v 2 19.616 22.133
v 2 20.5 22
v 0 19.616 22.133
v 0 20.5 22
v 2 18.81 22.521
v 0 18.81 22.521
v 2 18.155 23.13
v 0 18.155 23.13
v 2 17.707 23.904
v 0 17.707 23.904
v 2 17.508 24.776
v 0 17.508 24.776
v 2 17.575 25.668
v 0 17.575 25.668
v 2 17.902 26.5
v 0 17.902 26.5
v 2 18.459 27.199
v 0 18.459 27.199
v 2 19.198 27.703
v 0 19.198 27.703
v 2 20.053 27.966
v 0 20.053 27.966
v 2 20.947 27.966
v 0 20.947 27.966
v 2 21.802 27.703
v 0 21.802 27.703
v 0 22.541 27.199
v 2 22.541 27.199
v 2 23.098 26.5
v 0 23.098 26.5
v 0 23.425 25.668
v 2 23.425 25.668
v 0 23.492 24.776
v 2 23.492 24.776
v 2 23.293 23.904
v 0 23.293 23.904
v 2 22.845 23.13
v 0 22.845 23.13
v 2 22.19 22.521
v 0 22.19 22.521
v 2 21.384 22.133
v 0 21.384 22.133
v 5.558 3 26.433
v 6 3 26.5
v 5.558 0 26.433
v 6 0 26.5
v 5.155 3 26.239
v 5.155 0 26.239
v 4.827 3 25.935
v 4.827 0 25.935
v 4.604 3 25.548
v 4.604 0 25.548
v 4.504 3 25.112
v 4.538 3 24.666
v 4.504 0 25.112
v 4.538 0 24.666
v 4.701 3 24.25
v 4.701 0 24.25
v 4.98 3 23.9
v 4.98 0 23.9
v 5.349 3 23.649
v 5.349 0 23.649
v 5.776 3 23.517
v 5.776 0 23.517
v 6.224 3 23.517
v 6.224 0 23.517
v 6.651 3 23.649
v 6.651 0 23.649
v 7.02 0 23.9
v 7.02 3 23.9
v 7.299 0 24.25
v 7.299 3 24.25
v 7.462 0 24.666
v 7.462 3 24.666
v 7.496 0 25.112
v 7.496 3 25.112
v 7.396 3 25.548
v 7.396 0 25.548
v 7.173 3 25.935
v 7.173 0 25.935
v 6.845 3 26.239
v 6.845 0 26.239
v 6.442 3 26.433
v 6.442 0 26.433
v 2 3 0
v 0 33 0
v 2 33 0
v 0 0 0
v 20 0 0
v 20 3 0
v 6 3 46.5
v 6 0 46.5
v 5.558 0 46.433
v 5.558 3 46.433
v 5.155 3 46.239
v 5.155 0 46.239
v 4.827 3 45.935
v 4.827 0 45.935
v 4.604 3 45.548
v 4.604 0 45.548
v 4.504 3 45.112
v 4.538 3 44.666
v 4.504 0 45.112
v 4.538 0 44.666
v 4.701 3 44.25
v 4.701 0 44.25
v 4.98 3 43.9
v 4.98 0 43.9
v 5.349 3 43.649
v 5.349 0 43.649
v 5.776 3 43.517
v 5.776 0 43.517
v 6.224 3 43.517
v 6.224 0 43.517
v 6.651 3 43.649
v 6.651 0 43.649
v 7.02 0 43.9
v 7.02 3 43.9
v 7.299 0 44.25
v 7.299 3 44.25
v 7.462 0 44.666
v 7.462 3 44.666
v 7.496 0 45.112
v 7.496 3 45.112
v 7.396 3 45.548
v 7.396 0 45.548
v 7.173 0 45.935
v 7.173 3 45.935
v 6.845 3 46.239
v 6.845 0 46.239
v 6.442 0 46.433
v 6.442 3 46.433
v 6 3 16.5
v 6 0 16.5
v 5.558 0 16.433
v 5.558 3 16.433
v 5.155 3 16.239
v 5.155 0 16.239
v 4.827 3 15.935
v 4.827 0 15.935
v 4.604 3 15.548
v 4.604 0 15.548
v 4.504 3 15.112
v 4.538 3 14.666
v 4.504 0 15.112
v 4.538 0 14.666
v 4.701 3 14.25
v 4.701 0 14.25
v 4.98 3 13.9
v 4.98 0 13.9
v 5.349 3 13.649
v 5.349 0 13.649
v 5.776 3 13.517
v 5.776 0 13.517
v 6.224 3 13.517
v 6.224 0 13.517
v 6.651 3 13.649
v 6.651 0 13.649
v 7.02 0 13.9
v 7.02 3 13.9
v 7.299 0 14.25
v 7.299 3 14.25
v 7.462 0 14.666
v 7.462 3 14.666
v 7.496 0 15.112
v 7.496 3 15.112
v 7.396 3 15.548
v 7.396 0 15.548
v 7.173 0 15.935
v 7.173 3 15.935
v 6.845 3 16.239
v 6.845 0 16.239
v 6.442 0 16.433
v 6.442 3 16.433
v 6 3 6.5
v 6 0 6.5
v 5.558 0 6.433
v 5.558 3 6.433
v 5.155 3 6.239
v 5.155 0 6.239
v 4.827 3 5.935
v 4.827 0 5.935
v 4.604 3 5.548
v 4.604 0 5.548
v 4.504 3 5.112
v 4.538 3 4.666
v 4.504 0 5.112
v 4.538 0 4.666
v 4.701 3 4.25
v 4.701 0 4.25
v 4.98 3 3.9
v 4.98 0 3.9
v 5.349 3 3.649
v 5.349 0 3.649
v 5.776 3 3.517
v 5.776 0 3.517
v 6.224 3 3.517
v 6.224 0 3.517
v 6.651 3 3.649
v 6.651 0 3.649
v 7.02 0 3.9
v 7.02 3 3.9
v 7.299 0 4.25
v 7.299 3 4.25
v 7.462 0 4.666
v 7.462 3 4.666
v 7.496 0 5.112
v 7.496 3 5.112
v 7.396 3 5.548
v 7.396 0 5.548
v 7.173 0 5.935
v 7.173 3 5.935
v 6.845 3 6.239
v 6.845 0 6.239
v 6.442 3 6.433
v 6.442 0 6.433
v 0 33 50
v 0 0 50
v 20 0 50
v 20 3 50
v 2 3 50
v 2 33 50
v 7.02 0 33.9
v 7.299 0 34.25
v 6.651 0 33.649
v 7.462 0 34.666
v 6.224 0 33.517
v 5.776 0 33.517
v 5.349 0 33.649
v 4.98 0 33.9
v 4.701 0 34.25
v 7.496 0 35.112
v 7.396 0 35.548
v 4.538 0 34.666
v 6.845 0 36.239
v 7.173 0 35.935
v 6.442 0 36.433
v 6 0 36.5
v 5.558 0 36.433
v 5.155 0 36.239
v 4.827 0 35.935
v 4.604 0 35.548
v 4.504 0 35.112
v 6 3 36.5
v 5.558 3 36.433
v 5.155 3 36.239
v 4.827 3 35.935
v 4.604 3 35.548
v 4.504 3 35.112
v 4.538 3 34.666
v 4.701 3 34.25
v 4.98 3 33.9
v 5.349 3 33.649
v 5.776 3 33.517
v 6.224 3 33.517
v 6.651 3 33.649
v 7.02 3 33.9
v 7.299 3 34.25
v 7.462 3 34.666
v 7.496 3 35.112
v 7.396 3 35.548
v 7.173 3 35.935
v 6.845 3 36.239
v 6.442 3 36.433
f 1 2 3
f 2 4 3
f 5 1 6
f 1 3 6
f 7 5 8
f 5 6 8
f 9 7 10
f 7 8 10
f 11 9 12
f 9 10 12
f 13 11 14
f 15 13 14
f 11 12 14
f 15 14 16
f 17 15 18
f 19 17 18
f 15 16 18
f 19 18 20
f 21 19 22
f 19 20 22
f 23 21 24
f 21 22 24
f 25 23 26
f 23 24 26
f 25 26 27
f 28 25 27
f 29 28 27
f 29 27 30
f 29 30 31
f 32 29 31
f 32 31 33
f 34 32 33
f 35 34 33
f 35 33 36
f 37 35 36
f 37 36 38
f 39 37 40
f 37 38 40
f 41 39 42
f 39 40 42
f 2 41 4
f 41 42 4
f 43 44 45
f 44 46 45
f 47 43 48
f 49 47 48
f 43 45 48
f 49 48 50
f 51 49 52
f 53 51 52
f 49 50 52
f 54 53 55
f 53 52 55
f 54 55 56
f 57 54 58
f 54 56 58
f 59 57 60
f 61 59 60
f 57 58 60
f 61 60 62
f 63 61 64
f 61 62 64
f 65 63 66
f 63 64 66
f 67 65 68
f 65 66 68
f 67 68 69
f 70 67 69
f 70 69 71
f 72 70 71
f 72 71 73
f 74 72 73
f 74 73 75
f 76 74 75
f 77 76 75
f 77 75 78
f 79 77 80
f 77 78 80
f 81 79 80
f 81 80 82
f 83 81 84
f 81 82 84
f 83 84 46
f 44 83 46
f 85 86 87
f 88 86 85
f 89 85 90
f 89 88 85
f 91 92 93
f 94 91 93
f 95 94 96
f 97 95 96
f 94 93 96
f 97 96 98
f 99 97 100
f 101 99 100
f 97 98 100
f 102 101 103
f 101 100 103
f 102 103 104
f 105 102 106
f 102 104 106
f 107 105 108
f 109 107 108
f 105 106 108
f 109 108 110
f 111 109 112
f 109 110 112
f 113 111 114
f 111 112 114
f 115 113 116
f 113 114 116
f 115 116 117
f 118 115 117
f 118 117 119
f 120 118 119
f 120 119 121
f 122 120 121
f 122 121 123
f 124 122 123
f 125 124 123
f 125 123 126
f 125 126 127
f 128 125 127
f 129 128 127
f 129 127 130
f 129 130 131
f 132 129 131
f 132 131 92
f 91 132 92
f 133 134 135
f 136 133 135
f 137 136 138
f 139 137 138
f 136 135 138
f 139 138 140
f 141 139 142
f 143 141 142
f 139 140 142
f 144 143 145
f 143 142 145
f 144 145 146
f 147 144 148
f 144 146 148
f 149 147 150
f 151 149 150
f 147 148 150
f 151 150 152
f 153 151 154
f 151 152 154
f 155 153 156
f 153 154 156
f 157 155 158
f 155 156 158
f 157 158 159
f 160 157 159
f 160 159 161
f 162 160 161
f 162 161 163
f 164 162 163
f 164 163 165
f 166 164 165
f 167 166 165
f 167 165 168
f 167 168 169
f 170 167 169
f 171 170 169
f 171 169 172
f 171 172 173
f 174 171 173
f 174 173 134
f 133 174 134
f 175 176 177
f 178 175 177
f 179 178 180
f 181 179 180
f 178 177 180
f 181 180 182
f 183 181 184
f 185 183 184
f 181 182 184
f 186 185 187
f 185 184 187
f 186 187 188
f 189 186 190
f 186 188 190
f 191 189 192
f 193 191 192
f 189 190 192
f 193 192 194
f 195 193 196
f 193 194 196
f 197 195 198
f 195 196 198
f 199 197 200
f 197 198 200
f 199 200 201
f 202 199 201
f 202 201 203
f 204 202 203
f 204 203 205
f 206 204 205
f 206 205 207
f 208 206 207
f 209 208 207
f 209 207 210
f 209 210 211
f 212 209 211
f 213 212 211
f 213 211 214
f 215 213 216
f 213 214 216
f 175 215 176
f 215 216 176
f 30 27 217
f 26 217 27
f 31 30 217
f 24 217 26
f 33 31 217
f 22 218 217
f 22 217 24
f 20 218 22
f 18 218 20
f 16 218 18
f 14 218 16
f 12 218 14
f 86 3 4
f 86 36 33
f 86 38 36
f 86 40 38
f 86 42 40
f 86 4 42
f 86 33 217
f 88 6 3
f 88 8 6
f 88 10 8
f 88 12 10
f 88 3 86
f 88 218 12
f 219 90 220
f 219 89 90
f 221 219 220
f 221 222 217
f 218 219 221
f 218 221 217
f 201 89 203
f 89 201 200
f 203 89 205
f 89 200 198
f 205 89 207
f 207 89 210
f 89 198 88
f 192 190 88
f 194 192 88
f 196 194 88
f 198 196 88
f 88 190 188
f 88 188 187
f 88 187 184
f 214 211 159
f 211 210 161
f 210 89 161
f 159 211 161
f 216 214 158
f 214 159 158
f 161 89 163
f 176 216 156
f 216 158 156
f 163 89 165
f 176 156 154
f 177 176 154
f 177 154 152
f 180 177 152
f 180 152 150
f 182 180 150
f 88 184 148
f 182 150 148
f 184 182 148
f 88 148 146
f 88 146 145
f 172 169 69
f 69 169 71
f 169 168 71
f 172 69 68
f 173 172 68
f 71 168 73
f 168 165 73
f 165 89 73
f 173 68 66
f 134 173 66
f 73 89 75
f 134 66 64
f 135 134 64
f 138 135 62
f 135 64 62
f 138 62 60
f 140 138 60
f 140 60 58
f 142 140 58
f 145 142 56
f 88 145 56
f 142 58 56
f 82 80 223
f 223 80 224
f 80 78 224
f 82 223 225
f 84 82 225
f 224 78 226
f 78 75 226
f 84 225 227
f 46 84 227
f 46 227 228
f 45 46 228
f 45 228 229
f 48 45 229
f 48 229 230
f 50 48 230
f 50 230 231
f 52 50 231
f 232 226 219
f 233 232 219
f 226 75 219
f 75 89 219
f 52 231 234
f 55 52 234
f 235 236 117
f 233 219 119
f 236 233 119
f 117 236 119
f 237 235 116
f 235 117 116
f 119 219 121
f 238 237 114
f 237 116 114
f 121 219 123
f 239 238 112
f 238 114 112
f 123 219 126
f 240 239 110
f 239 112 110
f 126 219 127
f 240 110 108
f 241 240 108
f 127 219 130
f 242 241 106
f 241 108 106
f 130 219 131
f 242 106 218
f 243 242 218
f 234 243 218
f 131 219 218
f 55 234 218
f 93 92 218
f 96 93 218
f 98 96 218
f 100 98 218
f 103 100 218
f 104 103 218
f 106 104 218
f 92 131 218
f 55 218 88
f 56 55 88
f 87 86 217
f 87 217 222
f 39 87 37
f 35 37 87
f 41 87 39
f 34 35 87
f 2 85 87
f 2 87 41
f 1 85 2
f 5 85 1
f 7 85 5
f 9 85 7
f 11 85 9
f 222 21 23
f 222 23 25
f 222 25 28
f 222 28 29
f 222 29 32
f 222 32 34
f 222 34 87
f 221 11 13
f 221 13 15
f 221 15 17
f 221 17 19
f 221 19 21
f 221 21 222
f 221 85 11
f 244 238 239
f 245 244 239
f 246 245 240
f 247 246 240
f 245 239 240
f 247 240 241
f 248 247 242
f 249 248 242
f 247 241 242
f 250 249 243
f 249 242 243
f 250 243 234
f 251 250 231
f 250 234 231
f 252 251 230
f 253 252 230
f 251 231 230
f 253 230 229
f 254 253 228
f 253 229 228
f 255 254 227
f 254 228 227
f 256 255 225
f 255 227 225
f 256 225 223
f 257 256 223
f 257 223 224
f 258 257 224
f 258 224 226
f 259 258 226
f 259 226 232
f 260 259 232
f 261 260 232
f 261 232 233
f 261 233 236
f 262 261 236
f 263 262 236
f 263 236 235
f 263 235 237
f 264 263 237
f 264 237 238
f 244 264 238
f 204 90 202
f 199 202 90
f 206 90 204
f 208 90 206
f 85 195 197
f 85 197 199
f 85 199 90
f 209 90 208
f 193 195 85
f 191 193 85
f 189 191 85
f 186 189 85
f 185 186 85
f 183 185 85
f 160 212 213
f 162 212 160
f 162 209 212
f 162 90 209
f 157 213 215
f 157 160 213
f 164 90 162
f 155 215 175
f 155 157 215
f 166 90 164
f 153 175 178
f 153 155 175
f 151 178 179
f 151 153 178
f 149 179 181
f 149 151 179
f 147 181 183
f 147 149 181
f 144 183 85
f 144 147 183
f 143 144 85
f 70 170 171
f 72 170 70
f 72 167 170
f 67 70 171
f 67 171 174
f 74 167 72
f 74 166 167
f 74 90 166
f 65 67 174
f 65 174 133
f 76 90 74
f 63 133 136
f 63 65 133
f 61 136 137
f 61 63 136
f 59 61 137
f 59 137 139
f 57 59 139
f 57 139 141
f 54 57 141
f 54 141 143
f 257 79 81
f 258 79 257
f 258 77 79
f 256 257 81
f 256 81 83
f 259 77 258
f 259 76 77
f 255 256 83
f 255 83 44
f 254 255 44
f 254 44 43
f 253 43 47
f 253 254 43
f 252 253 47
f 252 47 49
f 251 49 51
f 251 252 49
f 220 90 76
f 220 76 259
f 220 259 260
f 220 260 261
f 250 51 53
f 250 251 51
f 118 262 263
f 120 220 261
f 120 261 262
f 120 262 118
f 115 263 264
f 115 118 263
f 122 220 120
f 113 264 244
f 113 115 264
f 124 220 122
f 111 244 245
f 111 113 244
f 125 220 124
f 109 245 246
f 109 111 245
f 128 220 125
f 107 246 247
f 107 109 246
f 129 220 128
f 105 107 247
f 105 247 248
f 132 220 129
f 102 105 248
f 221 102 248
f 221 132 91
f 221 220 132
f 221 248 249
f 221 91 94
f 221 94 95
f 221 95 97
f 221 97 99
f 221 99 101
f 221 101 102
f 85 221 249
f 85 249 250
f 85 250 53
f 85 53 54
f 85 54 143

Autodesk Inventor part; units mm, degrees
ref_plane "YZ Plane" through (0, 0, 0) normal (1, 0, 0) x (0, 1, 0)
ref_plane "XZ Plane" through (0, 0, 0) normal (0, 1, 0) x (-1, 0, 0)
ref_plane "XY Plane" through (0, 0, 0) normal (0, 0, 1) x (1, 0, 0)
sketch "スケッチ1" plane through (0, 0, 0) normal (0, 1, 0) x (-1, 0, 0)
  line L0 (0, 0) -> (-20, 0)
  line L1 (-20, 0) -> (-20, 50)
  line L2 (-20, 50) -> (0, 50)
  line L3 (0, 50) -> (0, 0)
  dimension "d0" = 20
  dimension "d1" = 50
extrude "押し出し1" add sketch "スケッチ1" along normal blind 3
sketch "スケッチ2" plane through (0, 3, 0) normal (0, 1, 0) x (1, 0, 0)
  line L0 (0, -50) -> (20, -50) projected
  line L1 (0, 0) -> (2, 0)
  line L2 (2, 0) -> (2, -50)
  line L3 (2, -50) -> (0, -50)
  line L4 (0, -50) -> (0, 0)
  dimension "d4" = 2
extrude "押し出し2" add sketch "スケッチ2" along normal blind 30
sketch "スケッチ3" plane through (2, 3, 50) normal (1, 0, 0) x (0, 0, -1)
  line L0 (50, 0) -> (0, 0) projected
  line L1 (0, 0) -> (0, 30) projected
  line L2 (25, 0) -> (25, 17.5)
  circle A0 centre (25, 17.5) radius 3
  point P0 (50, -3)
  dimension "d7" = 17.5
  dimension "d8" = 6
hole "穴1" at (2, 20.5, 25) direction (-1, 0, 0) diameter 6 depth 8 tip angle 118
sketch "スケッチ4" plane through (0, 3, 0) normal (0, 1, 0) x (1, 0, 0)
  line L0 (20, -50) -> (20, 0) projected
  line L1 (20, 0) -> (2, 0) projected
  line L2 (20, -25) -> (6, -25)
  line L3 (6, -25) -> (6, -15)
  line L4 (6, -15) -> (6, -5)
  point P0 (0, 0)
  point P1 (6, -45)
  point P2 (6, -35)
  point P3 (6, -45)
  dimension "d16" = 14
  dimension "d17" = 10
  dimension "d18" = 10
hole "穴2" at (6, 3, 5) at (6, 3, 15) at (6, 3, 25) at (6, 3, 35) at (6, 3, 45) direction (0, -1, 0) diameter 3 depth 8 tip angle 118
properties part number "知能ロボコンＬ字"
